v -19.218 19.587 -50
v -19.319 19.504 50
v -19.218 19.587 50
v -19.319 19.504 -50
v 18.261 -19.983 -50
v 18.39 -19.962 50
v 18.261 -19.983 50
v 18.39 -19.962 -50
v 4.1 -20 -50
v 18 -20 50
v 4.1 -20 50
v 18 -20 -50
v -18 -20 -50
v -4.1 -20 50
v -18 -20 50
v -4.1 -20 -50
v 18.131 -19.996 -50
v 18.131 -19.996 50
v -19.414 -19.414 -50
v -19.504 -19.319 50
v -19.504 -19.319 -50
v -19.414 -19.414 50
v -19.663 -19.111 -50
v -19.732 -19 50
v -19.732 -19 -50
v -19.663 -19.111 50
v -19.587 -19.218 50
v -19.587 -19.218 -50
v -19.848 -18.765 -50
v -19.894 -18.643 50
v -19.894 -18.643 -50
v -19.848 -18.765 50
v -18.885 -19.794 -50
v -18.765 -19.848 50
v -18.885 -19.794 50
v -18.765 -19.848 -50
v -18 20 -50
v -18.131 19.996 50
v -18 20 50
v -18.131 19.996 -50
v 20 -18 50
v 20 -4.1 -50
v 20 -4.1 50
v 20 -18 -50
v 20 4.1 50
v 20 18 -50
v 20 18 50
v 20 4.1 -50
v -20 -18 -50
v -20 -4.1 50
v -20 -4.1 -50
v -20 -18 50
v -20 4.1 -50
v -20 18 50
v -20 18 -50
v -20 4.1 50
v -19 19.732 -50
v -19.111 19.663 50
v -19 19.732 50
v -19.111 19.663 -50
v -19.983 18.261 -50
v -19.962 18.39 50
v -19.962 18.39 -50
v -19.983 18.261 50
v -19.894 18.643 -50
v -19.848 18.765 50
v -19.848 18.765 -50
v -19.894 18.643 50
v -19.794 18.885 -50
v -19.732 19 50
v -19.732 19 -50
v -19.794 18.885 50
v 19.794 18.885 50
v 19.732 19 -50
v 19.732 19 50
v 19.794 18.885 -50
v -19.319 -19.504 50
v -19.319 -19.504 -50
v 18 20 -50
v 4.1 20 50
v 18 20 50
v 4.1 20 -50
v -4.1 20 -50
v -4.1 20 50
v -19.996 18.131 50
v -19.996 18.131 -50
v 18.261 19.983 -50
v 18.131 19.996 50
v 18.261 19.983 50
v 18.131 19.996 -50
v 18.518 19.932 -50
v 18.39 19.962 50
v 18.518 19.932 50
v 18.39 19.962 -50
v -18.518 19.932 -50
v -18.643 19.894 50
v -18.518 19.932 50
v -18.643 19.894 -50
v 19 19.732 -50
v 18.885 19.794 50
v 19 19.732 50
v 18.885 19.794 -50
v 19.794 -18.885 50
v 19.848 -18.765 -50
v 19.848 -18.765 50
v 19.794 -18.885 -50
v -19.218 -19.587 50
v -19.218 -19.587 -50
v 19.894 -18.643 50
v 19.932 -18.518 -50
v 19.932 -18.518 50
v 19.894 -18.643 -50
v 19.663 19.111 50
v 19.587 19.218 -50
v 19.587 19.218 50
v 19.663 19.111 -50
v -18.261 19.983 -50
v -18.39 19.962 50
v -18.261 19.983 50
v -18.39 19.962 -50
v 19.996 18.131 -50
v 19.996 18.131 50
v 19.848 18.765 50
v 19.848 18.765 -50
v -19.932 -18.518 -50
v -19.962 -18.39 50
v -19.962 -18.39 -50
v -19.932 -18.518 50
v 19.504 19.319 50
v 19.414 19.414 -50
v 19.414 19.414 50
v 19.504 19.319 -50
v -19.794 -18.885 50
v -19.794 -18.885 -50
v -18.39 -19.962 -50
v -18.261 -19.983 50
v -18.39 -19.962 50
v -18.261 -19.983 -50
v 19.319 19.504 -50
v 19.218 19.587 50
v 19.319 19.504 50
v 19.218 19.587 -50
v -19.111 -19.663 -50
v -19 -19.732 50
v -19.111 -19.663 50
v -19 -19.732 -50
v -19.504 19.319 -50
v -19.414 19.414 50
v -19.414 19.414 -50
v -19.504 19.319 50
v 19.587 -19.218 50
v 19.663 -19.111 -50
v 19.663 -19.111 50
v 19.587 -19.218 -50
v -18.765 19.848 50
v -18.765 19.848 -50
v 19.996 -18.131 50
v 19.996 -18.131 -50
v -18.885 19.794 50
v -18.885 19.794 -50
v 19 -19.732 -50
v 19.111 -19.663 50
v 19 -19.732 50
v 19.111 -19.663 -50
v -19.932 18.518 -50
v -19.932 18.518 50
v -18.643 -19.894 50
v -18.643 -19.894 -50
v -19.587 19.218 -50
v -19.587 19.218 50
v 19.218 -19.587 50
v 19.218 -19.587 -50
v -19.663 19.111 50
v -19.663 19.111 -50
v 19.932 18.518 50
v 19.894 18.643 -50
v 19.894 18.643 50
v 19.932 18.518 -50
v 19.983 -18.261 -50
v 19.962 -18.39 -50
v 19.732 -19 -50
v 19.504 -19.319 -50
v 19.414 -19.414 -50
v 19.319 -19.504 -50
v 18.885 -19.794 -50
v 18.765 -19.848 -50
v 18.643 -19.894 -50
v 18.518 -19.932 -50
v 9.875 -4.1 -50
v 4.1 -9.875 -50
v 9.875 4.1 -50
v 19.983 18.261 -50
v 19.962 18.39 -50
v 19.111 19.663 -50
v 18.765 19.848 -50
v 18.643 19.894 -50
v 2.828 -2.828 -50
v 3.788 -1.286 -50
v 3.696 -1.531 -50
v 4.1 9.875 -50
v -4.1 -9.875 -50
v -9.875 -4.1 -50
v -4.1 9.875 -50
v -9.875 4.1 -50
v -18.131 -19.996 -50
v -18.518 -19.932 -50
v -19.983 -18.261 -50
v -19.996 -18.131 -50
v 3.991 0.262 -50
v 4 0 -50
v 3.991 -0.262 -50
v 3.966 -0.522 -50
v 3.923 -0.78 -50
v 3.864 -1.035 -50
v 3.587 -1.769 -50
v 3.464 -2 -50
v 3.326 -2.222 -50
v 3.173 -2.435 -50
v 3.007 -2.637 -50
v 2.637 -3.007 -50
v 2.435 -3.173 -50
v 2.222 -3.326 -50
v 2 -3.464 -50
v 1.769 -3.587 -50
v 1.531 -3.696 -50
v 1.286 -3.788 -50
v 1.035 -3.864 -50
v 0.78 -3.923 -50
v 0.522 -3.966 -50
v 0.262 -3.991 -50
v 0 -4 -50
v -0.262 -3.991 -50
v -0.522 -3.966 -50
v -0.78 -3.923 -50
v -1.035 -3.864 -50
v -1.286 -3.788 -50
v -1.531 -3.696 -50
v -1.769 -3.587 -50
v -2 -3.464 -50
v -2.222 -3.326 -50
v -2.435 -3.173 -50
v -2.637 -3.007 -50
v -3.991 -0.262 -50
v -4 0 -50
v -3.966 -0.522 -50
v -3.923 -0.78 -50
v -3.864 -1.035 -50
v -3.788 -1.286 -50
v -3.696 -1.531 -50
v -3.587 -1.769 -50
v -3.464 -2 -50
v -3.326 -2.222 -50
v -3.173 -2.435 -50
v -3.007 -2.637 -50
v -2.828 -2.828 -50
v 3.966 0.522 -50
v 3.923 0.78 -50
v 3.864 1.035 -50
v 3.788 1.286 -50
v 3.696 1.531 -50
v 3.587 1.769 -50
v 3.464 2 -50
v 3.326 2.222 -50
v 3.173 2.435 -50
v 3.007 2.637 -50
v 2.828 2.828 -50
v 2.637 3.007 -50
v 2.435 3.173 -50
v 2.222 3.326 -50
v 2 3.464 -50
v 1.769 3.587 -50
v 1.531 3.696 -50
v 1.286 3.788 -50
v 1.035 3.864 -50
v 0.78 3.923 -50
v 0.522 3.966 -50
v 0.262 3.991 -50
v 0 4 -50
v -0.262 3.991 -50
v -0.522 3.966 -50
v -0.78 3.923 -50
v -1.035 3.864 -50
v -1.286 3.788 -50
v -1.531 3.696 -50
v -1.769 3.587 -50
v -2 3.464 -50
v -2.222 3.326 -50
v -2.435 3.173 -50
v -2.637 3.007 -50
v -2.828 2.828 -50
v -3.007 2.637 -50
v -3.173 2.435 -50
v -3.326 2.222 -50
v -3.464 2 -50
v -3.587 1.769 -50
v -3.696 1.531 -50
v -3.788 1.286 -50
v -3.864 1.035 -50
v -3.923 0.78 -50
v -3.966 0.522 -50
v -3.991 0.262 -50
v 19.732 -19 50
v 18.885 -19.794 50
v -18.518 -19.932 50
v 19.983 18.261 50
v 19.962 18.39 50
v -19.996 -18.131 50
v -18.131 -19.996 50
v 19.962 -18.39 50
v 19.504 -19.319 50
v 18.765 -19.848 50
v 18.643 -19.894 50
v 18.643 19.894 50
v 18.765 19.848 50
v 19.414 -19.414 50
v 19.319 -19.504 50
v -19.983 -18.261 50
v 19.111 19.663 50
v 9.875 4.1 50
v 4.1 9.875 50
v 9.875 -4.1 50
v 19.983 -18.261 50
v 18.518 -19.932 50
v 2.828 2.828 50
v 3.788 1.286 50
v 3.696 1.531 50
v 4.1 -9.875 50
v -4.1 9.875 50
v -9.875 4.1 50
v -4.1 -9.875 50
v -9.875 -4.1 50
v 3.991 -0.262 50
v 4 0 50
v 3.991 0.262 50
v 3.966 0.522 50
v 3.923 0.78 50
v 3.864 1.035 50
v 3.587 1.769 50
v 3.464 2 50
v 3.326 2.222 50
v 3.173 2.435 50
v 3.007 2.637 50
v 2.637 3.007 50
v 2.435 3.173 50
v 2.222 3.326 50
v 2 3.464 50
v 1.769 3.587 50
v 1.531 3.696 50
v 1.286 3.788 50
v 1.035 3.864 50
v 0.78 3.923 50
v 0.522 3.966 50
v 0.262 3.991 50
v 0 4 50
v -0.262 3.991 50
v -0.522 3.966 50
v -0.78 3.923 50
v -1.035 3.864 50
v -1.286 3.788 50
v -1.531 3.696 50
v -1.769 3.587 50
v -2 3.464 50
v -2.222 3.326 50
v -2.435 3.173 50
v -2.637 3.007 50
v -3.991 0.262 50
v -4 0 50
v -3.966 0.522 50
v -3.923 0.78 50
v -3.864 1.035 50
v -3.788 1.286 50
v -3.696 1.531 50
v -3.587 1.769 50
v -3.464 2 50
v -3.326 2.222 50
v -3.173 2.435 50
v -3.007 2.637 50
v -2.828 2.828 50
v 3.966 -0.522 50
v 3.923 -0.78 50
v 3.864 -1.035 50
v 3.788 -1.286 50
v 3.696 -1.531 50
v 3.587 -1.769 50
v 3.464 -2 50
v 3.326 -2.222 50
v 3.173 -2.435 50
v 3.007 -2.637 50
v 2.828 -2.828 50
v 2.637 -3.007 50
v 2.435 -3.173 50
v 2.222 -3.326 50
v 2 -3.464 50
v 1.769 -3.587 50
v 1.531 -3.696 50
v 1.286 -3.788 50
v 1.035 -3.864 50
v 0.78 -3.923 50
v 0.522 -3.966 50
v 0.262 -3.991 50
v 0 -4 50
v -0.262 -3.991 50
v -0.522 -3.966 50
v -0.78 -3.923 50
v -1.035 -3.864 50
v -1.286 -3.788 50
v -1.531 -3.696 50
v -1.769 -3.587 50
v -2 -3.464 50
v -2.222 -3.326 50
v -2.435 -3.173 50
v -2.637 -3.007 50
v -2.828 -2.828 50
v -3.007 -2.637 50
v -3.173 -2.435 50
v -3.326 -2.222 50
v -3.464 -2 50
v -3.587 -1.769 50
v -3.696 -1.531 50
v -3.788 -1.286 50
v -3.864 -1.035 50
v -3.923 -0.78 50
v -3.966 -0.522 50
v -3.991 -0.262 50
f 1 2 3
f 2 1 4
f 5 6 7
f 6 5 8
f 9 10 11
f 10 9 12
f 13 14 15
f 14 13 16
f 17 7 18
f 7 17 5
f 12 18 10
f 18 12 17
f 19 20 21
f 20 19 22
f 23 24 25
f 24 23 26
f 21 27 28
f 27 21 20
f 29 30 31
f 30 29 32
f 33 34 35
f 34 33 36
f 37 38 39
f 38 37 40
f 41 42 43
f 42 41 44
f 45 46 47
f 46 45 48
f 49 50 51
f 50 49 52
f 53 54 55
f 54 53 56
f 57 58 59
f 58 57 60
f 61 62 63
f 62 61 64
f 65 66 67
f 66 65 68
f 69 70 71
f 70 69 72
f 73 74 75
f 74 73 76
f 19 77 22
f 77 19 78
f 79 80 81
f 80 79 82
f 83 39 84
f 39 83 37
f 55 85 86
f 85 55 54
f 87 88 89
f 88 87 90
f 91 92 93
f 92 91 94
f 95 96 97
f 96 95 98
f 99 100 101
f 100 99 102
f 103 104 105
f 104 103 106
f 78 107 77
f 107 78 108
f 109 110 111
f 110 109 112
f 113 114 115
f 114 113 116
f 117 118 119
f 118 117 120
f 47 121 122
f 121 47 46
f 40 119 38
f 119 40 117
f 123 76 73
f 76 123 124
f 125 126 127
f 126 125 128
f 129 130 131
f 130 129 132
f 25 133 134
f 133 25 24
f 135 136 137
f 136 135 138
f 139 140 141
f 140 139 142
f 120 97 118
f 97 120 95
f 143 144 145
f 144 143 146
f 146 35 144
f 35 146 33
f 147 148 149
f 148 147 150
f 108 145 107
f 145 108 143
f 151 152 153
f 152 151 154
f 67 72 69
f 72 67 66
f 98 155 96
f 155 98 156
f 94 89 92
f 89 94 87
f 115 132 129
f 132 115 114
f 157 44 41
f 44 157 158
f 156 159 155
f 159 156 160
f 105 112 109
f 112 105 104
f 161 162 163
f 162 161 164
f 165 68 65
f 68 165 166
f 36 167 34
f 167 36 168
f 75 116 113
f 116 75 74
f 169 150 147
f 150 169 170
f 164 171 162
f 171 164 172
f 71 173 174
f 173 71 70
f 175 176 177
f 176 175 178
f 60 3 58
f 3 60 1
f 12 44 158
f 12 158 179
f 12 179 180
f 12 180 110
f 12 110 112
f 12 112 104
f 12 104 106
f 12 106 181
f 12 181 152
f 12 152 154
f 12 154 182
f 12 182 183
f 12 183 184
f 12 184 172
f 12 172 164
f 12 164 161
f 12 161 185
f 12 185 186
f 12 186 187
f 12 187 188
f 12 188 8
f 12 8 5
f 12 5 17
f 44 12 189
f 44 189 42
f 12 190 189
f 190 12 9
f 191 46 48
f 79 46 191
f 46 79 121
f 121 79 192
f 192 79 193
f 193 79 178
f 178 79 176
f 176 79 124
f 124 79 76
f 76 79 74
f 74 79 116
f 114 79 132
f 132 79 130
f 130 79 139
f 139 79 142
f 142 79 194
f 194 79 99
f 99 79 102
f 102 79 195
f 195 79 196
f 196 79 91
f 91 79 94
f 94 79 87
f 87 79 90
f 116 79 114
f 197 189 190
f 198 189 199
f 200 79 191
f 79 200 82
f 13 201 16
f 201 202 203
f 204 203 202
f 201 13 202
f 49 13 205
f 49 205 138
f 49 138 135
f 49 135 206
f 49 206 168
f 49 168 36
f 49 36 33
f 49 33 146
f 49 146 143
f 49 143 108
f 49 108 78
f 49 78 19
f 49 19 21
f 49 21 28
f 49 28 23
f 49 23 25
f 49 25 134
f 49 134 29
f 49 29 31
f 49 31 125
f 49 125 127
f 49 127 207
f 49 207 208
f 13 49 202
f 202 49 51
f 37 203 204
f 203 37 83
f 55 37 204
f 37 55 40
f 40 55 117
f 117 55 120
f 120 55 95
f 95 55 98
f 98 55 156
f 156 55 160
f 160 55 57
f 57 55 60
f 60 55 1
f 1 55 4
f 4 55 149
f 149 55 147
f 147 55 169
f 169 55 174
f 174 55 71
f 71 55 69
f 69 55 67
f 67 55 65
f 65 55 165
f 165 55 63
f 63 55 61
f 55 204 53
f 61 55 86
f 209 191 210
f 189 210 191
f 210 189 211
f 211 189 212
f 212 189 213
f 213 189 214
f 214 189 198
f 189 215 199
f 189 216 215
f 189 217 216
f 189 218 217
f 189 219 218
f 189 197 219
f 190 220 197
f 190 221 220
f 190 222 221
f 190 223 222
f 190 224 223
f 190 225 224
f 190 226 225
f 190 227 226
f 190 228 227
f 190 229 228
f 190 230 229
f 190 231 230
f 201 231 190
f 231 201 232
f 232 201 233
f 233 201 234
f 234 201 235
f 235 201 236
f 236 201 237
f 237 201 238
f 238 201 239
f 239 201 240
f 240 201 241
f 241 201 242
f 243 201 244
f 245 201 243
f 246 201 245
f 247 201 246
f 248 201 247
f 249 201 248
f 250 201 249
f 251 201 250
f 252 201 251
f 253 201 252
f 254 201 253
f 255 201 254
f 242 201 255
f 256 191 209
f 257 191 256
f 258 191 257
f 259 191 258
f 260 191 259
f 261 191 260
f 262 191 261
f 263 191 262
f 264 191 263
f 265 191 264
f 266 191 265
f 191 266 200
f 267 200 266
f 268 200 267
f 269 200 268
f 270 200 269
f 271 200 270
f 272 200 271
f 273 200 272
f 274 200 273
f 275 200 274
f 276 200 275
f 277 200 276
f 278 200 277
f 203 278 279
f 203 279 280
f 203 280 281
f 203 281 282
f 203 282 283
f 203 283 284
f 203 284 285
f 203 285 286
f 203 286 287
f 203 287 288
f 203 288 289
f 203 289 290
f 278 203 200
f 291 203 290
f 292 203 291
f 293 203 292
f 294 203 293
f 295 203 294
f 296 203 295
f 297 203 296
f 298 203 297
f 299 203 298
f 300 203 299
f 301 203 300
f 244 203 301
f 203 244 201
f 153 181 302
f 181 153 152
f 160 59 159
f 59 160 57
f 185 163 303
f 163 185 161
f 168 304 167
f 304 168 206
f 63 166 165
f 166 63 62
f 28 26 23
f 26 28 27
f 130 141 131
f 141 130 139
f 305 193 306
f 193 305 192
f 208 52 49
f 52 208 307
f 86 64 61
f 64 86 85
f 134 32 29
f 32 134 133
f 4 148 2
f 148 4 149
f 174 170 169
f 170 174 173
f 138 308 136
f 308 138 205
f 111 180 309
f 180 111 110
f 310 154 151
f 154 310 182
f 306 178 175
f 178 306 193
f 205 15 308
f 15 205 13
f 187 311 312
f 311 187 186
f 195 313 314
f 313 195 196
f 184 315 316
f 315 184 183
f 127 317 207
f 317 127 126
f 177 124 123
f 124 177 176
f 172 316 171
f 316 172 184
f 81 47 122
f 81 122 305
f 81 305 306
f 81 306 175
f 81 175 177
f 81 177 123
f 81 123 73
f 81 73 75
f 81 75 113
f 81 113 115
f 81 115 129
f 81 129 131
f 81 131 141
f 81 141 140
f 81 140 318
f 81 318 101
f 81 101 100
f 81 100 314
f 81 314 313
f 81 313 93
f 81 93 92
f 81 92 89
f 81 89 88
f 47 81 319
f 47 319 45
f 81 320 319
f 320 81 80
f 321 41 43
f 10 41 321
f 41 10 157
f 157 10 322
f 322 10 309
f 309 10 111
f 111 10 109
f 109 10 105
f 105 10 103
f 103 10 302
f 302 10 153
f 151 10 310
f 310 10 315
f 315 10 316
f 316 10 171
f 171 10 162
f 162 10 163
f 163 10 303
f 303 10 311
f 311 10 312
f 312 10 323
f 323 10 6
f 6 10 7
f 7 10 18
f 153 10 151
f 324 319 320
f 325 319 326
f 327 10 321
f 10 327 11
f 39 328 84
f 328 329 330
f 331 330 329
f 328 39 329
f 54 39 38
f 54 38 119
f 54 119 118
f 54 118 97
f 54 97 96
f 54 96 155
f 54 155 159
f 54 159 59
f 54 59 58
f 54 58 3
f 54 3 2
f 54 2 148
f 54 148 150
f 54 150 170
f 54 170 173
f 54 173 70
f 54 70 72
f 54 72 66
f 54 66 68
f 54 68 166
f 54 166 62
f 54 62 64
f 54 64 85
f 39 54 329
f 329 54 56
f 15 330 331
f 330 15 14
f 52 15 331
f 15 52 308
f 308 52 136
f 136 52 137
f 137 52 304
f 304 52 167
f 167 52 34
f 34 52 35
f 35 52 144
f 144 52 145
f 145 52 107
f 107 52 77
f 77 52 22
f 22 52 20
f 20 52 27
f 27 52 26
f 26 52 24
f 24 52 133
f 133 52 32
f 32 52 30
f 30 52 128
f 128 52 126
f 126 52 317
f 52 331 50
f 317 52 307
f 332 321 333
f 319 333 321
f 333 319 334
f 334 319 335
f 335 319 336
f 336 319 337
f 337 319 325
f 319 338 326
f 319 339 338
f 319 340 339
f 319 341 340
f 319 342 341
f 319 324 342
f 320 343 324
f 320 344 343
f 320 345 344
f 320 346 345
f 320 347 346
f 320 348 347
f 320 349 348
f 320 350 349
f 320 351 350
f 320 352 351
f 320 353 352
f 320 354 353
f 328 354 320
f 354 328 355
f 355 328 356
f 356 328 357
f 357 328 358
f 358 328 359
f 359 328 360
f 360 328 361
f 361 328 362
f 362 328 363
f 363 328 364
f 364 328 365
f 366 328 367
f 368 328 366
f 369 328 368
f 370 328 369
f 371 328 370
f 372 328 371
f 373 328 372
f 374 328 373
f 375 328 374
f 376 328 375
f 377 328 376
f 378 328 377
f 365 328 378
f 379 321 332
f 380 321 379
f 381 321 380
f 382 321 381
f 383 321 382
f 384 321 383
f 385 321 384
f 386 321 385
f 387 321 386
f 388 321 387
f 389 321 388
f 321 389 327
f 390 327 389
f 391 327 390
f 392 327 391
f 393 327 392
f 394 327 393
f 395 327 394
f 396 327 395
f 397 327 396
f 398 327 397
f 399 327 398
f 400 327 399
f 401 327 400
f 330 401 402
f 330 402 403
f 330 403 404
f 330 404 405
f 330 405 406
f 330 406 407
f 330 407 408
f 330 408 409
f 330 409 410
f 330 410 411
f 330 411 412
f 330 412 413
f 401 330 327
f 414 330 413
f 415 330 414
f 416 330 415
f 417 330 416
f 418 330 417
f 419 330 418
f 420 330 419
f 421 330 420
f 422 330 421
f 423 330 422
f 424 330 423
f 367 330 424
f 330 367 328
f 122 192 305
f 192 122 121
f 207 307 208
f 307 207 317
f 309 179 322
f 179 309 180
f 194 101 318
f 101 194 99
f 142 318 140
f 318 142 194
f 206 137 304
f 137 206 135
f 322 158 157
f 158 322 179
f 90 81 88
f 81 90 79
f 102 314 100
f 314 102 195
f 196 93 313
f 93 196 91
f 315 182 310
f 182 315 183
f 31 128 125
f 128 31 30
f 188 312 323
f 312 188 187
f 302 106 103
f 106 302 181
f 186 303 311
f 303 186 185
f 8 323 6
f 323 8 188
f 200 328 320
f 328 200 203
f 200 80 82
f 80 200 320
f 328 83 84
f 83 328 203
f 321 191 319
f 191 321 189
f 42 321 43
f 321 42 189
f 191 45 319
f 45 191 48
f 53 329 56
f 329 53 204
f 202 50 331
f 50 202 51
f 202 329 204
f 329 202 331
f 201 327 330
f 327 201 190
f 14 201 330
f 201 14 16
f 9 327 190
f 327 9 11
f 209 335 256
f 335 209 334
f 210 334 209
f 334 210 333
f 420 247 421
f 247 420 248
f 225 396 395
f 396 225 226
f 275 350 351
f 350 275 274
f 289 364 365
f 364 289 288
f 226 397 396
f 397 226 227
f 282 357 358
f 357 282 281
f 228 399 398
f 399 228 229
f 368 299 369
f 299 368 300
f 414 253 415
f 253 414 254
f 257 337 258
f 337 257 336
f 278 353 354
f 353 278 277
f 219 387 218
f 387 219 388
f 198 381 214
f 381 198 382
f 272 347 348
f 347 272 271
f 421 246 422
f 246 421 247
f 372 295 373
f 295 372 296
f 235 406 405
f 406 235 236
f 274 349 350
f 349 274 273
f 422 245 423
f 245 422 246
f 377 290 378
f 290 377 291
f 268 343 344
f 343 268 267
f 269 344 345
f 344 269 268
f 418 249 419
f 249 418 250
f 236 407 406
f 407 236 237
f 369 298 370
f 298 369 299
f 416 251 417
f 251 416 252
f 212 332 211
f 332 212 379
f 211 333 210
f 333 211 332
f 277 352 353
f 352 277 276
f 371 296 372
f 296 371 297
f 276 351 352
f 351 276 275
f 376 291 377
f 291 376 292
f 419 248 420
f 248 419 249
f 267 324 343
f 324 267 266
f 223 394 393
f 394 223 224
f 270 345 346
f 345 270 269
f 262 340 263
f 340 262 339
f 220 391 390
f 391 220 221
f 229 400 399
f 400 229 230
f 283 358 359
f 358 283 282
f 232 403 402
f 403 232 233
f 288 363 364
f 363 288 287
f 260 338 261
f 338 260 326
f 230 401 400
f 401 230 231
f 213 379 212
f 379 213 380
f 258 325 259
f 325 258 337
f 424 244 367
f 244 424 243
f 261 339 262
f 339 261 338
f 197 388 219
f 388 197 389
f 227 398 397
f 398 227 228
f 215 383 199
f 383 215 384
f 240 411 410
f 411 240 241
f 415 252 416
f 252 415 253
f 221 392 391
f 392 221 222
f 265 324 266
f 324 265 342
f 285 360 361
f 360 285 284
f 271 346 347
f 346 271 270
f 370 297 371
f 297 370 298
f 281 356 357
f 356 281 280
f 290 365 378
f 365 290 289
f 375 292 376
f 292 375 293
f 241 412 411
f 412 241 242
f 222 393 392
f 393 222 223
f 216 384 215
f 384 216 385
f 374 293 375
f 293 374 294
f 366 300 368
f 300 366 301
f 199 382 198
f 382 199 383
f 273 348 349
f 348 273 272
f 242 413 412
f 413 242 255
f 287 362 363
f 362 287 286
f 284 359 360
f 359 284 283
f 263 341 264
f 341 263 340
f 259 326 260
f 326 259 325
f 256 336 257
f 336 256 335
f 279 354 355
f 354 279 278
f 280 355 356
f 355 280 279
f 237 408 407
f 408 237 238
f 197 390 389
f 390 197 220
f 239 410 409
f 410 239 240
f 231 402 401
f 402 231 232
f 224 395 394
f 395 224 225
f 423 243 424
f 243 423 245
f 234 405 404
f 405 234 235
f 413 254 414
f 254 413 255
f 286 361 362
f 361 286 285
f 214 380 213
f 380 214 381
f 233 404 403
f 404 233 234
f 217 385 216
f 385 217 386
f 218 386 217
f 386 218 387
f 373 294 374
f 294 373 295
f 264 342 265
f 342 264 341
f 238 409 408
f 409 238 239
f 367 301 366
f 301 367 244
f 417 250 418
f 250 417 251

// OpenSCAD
// 40x40 T-slot aluminium extrusion profile, 100mm long
// One connected solid, standard-ish 40-series look (4 outer T-slots + center bore)

$fn = 96;

// Parameters
profile_width_mm  = 40.0;
profile_height_mm = 40.0;
length_mm         = 100.0;
center            = 1;

// Geometry controls (kept conservative so it always remains one connected solid)
corner_radius_mm        = 2.0;   // outer corner rounding
t_slot_opening_mm       = 8.2;   // opening at the face
t_slot_neck_mm          = 6.2;   // narrower neck inside
t_slot_depth_mm         = 10.0;  // depth from face toward center
t_slot_head_extra_mm    = 3.0;   // extra widening behind the neck (T-head)
center_bore_diameter_mm = 8.0;

overlap_mm = 0.25;

// Derived
W = profile_width_mm;
H = profile_height_mm;
L = length_mm;

slot_open = t_slot_opening_mm;
slot_neck = min(t_slot_neck_mm, slot_open - 0.2);
slot_d    = min(t_slot_depth_mm, min(W, H)/2 - 3.0);
head_extra = max(0, t_slot_head_extra_mm);

module rounded_rect_2d(w, h, r){
  r2 = min(r, min(w, h)/2);
  offset(r=r2) offset(delta=-r2) square([w, h], center=true);
}

module tslot_cut_2d(W, H, slot_open, slot_neck, slot_d, head_extra){
  // Builds 4 T-slot cutouts in 2D (to be linear_extruded along Z)
  union() {
    // +X face slot
    translate([ W/2 - slot_d/2, 0 ])
      square([slot_d + overlap_mm, slot_open], center=true);

    // -X face slot
    translate([-W/2 + slot_d/2, 0 ])
      square([slot_d + overlap_mm, slot_open], center=true);

    // +Y face slot
    translate([0,  H/2 - slot_d/2 ])
      square([slot_open, slot_d + overlap_mm], center=true);

    // -Y face slot
    translate([0, -H/2 + slot_d/2 ])
      square([slot_open, slot_d + overlap_mm], center=true);

    // T-head widening behind the neck (keeps a more typical T-slot look)
    // +X
    translate([ W/2 - (slot_d - head_extra)/2, 0 ])
      square([max(0.01, slot_d - head_extra) + overlap_mm, slot_neck], center=true);

    // -X
    translate([-W/2 + (slot_d - head_extra)/2, 0 ])
      square([max(0.01, slot_d - head_extra) + overlap_mm, slot_neck], center=true);

    // +Y
    translate([0,  H/2 - (slot_d - head_extra)/2 ])
      square([slot_neck, max(0.01, slot_d - head_extra) + overlap_mm], center=true);

    // -Y
    translate([0, -H/2 + (slot_d - head_extra)/2 ])
      square([slot_neck, max(0.01, slot_d - head_extra) + overlap_mm], center=true);
  }
}

module extrusion_40x40(){
  translate(center ? [0,0,0] : [W/2, H/2, L/2])
  color("Silver")
  difference() {
    // Outer body (rounded corners)
    linear_extrude(height=L, center=true, convexity=10)
      rounded_rect_2d(W, H, corner_radius_mm);

    // 4 T-slots (cut through full length)
    linear_extrude(height=L + 2*overlap_mm, center=true, convexity=10)
      tslot_cut_2d(W, H, slot_open, slot_neck, slot_d, head_extra);

    // Center bore along Z
    cylinder(d=center_bore_diameter_mm, h=L + 2*overlap_mm, center=true);
  }
}

extrusion_40x40();
